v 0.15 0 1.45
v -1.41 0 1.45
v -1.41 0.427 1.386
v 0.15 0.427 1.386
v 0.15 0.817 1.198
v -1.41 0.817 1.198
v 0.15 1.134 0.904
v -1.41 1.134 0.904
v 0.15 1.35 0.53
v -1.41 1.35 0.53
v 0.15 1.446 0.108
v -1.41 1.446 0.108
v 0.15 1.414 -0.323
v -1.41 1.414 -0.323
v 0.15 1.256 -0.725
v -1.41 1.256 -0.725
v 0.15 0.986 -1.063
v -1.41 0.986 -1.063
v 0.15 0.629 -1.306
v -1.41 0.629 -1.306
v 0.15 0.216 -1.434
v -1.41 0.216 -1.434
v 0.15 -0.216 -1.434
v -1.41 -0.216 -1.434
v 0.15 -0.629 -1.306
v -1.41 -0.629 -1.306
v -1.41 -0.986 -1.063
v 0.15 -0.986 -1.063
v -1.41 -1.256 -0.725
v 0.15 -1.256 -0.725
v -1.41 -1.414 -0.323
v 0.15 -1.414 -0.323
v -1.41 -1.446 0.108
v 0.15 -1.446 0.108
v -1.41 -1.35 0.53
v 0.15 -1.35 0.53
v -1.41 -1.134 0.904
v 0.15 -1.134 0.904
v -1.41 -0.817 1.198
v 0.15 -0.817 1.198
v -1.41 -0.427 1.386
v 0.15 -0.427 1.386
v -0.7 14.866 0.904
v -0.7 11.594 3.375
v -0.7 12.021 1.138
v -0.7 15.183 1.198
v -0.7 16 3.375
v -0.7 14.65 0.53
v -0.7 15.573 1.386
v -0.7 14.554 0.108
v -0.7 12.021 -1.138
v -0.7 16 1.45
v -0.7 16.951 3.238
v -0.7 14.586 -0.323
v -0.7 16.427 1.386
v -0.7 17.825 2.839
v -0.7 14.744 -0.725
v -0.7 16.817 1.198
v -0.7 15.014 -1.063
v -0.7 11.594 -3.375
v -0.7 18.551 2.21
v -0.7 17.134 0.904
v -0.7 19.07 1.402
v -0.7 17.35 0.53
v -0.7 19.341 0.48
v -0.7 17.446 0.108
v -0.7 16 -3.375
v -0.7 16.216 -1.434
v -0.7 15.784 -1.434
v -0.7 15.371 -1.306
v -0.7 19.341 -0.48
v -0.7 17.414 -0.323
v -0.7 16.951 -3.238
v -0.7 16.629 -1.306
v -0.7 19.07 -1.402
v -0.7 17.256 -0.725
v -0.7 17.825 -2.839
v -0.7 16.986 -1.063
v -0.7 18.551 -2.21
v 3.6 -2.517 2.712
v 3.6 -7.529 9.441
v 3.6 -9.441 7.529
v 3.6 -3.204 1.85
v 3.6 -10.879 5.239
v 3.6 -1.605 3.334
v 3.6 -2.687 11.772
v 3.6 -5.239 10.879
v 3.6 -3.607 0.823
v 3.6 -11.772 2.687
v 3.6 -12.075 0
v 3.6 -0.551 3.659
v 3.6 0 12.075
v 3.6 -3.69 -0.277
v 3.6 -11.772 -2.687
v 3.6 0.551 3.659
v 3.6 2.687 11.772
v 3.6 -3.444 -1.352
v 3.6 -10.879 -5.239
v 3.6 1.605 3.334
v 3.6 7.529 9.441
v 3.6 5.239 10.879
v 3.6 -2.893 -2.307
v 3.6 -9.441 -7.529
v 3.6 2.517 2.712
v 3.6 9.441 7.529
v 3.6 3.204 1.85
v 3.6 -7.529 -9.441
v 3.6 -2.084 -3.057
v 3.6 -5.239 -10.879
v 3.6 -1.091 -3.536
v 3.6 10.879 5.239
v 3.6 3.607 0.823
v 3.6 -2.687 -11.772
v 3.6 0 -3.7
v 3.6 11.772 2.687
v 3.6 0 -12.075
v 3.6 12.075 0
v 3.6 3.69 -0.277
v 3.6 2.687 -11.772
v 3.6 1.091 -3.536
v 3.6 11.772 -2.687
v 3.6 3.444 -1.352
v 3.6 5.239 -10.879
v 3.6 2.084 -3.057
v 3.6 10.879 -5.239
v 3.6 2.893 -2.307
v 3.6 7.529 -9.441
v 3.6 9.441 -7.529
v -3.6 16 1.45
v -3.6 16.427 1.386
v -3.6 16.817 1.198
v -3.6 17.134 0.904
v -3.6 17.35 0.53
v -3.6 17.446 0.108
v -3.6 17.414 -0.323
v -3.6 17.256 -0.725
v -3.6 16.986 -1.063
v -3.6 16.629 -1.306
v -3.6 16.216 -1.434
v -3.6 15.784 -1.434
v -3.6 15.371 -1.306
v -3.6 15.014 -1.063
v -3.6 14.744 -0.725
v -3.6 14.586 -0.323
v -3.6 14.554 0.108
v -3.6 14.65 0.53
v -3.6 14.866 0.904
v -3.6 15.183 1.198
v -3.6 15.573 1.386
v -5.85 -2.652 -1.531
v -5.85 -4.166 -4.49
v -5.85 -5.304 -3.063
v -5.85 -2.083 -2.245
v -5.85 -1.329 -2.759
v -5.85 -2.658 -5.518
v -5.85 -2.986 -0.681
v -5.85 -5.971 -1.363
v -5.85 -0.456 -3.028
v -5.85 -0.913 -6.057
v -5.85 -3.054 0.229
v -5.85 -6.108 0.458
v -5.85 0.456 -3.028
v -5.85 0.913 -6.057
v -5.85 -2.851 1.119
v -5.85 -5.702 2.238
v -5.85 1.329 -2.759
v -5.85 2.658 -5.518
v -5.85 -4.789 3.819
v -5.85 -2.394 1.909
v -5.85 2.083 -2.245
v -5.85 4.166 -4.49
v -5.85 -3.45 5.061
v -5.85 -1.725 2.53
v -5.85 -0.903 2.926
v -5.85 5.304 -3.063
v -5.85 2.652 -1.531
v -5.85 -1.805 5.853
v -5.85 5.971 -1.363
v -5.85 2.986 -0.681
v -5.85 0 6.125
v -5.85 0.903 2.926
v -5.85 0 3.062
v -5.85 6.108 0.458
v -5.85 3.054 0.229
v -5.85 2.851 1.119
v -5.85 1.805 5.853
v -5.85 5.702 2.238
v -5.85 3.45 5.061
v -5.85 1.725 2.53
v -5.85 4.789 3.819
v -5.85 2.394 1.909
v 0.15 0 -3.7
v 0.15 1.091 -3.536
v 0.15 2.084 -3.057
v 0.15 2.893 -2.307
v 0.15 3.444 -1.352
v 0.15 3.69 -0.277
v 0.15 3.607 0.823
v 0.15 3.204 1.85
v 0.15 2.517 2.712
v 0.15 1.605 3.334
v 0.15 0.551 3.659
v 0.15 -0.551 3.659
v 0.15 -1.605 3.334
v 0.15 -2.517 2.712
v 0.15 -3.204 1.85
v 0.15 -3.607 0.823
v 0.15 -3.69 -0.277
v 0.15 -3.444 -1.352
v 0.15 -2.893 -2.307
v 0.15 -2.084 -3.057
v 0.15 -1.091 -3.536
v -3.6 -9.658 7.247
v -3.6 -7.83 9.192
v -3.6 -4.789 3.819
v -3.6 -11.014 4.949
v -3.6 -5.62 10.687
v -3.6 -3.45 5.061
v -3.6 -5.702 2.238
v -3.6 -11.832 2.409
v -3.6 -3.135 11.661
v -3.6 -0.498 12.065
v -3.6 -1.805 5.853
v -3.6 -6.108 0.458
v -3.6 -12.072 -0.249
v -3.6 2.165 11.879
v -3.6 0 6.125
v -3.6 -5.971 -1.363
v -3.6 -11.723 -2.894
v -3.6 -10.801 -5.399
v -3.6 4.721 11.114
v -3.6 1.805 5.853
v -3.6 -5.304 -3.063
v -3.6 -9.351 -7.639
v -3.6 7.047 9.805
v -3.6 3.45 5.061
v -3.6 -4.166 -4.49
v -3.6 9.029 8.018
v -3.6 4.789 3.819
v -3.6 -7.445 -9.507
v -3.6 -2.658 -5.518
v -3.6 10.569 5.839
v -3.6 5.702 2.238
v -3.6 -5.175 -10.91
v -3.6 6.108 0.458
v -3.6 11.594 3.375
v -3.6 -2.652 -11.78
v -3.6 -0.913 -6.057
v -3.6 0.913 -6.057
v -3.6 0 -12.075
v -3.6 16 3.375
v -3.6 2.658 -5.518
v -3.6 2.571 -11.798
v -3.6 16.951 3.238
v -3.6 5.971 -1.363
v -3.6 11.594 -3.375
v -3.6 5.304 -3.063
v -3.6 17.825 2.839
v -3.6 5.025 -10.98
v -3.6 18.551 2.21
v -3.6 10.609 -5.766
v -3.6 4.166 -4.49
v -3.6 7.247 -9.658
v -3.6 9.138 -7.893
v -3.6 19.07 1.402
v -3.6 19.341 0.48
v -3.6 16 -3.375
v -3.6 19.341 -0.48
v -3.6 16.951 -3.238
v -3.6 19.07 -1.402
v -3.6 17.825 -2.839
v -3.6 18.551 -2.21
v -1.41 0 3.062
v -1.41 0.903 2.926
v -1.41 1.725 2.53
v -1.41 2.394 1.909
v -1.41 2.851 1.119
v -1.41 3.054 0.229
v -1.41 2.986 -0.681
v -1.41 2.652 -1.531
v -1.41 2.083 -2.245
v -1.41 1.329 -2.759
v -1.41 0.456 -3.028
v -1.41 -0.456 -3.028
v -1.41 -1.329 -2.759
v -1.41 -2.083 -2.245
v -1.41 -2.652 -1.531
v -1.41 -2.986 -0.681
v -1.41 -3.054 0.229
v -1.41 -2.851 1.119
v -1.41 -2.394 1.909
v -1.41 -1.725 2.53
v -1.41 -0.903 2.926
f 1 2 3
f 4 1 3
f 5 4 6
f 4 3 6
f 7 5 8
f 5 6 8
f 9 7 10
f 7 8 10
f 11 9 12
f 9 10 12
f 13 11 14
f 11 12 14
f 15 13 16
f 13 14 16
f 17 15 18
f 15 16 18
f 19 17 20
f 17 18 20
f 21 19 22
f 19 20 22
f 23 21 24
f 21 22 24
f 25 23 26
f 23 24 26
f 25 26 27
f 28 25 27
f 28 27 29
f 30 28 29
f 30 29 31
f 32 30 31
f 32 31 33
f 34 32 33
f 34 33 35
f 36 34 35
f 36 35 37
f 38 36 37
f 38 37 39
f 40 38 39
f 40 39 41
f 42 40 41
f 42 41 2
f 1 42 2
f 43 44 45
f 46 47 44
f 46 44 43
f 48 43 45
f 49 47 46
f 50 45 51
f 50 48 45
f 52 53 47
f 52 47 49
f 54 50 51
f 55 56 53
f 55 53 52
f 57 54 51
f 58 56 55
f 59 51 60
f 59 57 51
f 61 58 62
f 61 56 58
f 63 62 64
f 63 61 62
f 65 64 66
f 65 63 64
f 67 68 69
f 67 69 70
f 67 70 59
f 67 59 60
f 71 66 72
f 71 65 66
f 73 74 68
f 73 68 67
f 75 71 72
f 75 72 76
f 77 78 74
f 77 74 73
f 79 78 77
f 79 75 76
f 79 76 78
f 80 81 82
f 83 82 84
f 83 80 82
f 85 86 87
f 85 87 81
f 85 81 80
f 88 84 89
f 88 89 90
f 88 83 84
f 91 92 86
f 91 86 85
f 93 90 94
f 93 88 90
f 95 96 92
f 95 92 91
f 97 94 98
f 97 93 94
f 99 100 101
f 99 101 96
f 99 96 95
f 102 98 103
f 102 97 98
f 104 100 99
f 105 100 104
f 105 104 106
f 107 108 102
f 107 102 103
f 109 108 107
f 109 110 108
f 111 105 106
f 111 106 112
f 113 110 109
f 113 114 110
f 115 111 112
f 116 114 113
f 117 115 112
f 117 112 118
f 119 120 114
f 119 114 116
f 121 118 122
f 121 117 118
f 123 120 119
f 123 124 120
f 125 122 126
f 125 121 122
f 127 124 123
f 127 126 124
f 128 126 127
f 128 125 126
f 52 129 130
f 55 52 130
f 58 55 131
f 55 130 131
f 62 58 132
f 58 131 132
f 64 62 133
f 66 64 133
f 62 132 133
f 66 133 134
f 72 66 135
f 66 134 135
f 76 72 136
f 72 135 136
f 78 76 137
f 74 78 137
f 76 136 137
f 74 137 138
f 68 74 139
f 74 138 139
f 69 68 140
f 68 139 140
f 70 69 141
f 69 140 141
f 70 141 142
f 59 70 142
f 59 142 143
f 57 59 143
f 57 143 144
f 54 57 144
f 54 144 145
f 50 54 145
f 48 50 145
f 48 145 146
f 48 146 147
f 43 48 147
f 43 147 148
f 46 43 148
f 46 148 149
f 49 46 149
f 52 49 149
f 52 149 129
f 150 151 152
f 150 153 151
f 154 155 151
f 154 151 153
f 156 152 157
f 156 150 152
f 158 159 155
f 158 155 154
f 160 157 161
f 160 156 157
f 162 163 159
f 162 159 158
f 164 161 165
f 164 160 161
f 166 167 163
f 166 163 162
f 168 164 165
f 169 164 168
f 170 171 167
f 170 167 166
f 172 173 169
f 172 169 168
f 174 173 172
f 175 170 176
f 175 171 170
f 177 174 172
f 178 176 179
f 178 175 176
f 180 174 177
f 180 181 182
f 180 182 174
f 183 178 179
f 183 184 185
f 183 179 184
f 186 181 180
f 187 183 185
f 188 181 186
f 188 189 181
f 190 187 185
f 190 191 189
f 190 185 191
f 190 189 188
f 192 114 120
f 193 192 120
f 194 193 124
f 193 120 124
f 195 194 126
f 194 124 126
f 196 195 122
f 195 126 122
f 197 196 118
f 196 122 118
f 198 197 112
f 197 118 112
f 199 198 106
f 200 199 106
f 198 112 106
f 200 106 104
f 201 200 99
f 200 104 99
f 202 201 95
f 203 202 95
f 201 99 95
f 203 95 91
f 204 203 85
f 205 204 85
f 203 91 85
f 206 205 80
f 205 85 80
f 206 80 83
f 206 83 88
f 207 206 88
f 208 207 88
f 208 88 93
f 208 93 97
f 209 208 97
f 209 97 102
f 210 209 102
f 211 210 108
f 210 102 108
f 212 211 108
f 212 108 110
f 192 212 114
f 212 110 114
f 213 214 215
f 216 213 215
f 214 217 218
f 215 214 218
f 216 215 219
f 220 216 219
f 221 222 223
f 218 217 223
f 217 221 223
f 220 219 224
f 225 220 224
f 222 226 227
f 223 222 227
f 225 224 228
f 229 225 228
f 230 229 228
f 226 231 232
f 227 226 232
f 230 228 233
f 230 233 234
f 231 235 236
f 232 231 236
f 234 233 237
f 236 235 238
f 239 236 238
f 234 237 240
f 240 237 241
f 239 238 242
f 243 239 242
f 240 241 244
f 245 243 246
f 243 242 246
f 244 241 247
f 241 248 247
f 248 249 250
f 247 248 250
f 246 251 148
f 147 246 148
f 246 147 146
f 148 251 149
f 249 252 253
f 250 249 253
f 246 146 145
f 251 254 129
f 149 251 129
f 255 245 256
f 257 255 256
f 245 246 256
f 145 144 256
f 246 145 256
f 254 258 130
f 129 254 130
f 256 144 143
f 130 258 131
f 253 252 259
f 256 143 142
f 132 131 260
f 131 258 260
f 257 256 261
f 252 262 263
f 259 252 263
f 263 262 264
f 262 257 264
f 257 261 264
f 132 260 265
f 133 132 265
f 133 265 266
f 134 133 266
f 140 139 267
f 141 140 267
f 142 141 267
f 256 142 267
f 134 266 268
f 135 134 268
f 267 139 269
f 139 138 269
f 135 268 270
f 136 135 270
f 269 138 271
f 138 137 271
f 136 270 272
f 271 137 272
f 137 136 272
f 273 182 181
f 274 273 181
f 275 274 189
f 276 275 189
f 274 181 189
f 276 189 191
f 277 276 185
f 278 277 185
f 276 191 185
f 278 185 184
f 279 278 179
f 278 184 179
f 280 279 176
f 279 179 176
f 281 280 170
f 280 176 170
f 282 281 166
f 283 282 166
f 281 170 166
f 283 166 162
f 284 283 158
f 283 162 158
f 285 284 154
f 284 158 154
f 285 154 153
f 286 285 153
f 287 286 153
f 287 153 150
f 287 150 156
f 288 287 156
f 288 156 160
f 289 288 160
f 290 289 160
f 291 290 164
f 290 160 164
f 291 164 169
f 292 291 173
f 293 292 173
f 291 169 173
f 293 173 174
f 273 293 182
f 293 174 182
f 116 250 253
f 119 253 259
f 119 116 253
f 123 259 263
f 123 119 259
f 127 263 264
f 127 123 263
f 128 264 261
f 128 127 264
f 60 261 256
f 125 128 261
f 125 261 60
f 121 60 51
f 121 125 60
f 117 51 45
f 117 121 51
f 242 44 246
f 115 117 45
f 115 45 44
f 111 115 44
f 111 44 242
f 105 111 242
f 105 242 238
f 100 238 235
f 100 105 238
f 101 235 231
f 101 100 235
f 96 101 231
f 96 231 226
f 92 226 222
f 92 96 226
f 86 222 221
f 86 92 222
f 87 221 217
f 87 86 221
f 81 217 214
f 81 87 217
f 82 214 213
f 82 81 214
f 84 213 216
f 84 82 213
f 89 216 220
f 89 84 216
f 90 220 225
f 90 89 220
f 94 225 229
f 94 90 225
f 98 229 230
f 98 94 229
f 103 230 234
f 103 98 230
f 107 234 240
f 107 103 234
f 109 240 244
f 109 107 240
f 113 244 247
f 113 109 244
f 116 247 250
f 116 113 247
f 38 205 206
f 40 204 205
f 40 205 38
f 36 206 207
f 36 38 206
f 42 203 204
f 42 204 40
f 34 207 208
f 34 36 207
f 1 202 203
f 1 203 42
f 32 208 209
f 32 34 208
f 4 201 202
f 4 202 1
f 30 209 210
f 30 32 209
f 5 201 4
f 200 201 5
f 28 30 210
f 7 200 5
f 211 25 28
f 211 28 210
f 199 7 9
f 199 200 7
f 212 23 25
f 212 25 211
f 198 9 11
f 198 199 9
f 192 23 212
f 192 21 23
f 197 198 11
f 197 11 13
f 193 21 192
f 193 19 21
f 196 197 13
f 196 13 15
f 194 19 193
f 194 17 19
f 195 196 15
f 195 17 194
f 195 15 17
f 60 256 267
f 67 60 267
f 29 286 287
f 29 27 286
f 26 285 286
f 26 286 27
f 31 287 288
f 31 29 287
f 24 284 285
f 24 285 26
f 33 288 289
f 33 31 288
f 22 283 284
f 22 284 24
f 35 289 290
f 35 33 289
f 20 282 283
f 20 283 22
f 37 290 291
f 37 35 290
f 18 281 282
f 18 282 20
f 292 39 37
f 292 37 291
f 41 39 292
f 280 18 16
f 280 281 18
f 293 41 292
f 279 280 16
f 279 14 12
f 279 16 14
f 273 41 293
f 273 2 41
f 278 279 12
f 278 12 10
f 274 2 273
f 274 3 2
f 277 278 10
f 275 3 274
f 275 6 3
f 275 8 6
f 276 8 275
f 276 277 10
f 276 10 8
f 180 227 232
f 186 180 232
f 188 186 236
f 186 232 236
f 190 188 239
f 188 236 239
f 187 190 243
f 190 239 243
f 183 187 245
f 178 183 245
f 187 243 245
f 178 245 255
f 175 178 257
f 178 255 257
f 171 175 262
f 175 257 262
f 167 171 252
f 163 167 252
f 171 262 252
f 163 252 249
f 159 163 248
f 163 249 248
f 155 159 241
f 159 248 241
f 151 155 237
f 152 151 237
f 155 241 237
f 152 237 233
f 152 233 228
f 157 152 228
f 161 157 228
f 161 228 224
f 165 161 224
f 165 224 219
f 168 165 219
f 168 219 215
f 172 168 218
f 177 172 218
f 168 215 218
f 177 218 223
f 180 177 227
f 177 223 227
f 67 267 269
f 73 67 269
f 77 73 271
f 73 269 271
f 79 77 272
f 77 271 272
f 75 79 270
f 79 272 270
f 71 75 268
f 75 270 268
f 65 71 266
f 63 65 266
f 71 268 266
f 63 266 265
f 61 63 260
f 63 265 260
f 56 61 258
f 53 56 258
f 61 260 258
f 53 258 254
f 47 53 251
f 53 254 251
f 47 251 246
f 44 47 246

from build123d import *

# Parameters (mm, degrees)
SKETCH1_R           = 12.075
BOSS_EXTRUDE1_DEPTH = 3.6
BOSS_EXTRUDE2_DEPTH = 2.9
SKETCH3_R           = 6.125
BOSS_EXTRUDE3_DEPTH = 2.25
SKETCH4_R           = 3.0625
CUT_EXTRUDE1_DEPTH  = 4.44
SKETCH5_R           = 1.45
CUT_EXTRUDE2_DEPTH  = 24.372983335
SKETCH6_R           = 3.7
CUT_EXTRUDE3_DEPTH  = 3.45
SKETCH7_R           = 1.45
CUT_EXTRUDE4_DEPTH  = 24.938175578


with BuildPart() as part:
    # Sketch1 → Boss-Extrude1 (new, symmetric)
    with BuildSketch(Plane(origin=(0, 0, 0), x_dir=(0, 0, -1), z_dir=(1, 0, 0))):
        Circle(SKETCH1_R)
    extrude(amount=BOSS_EXTRUDE1_DEPTH, both=True)

    # Sketch2 → Boss-Extrude2 (add)
    with BuildSketch(Plane.ZY.offset(3.6)):
        with BuildLine():
            Line((-3.375, 0), (-3.375, 16))
            ThreePointArc((-3.375, 16), (0, 19.375), (3.375, 16))
            Line((3.375, 16), (3.375, 0))
            ThreePointArc((3.375, 0), (0, -3.375), (-3.375, 0))
        make_face()
    extrude(amount=-BOSS_EXTRUDE2_DEPTH)

    # Sketch3 → Boss-Extrude3 (add)
    with BuildSketch(Plane.ZY.offset(3.6)):
        Circle(SKETCH3_R)
    extrude(amount=BOSS_EXTRUDE3_DEPTH)

    # Sketch4 → Cut-Extrude1 (cut)
    with BuildSketch(Plane.ZY.offset(5.85)):
        Circle(SKETCH4_R)
    extrude(amount=-CUT_EXTRUDE1_DEPTH, mode=Mode.SUBTRACT)

    # Sketch5 → Cut-Extrude2 (cut, through all)
    with BuildSketch(Plane.ZY.offset(1.41)):
        Circle(SKETCH5_R)
    extrude(amount=-CUT_EXTRUDE2_DEPTH, mode=Mode.SUBTRACT)

    # Sketch6 → Cut-Extrude3 (cut)
    with BuildSketch(Plane(origin=(3.6, 0, 0), x_dir=(0, 0, -1), z_dir=(1, 0, 0))):
        Circle(SKETCH6_R)
    extrude(amount=-CUT_EXTRUDE3_DEPTH, mode=Mode.SUBTRACT)

    # Sketch7 → Cut-Extrude4 (cut, through all)
    with BuildSketch(Plane.ZY.offset(3.6)):
        with Locations((0, 16)):
            Circle(SKETCH7_R)
    extrude(amount=-CUT_EXTRUDE4_DEPTH, mode=Mode.SUBTRACT)


solid = part.part
